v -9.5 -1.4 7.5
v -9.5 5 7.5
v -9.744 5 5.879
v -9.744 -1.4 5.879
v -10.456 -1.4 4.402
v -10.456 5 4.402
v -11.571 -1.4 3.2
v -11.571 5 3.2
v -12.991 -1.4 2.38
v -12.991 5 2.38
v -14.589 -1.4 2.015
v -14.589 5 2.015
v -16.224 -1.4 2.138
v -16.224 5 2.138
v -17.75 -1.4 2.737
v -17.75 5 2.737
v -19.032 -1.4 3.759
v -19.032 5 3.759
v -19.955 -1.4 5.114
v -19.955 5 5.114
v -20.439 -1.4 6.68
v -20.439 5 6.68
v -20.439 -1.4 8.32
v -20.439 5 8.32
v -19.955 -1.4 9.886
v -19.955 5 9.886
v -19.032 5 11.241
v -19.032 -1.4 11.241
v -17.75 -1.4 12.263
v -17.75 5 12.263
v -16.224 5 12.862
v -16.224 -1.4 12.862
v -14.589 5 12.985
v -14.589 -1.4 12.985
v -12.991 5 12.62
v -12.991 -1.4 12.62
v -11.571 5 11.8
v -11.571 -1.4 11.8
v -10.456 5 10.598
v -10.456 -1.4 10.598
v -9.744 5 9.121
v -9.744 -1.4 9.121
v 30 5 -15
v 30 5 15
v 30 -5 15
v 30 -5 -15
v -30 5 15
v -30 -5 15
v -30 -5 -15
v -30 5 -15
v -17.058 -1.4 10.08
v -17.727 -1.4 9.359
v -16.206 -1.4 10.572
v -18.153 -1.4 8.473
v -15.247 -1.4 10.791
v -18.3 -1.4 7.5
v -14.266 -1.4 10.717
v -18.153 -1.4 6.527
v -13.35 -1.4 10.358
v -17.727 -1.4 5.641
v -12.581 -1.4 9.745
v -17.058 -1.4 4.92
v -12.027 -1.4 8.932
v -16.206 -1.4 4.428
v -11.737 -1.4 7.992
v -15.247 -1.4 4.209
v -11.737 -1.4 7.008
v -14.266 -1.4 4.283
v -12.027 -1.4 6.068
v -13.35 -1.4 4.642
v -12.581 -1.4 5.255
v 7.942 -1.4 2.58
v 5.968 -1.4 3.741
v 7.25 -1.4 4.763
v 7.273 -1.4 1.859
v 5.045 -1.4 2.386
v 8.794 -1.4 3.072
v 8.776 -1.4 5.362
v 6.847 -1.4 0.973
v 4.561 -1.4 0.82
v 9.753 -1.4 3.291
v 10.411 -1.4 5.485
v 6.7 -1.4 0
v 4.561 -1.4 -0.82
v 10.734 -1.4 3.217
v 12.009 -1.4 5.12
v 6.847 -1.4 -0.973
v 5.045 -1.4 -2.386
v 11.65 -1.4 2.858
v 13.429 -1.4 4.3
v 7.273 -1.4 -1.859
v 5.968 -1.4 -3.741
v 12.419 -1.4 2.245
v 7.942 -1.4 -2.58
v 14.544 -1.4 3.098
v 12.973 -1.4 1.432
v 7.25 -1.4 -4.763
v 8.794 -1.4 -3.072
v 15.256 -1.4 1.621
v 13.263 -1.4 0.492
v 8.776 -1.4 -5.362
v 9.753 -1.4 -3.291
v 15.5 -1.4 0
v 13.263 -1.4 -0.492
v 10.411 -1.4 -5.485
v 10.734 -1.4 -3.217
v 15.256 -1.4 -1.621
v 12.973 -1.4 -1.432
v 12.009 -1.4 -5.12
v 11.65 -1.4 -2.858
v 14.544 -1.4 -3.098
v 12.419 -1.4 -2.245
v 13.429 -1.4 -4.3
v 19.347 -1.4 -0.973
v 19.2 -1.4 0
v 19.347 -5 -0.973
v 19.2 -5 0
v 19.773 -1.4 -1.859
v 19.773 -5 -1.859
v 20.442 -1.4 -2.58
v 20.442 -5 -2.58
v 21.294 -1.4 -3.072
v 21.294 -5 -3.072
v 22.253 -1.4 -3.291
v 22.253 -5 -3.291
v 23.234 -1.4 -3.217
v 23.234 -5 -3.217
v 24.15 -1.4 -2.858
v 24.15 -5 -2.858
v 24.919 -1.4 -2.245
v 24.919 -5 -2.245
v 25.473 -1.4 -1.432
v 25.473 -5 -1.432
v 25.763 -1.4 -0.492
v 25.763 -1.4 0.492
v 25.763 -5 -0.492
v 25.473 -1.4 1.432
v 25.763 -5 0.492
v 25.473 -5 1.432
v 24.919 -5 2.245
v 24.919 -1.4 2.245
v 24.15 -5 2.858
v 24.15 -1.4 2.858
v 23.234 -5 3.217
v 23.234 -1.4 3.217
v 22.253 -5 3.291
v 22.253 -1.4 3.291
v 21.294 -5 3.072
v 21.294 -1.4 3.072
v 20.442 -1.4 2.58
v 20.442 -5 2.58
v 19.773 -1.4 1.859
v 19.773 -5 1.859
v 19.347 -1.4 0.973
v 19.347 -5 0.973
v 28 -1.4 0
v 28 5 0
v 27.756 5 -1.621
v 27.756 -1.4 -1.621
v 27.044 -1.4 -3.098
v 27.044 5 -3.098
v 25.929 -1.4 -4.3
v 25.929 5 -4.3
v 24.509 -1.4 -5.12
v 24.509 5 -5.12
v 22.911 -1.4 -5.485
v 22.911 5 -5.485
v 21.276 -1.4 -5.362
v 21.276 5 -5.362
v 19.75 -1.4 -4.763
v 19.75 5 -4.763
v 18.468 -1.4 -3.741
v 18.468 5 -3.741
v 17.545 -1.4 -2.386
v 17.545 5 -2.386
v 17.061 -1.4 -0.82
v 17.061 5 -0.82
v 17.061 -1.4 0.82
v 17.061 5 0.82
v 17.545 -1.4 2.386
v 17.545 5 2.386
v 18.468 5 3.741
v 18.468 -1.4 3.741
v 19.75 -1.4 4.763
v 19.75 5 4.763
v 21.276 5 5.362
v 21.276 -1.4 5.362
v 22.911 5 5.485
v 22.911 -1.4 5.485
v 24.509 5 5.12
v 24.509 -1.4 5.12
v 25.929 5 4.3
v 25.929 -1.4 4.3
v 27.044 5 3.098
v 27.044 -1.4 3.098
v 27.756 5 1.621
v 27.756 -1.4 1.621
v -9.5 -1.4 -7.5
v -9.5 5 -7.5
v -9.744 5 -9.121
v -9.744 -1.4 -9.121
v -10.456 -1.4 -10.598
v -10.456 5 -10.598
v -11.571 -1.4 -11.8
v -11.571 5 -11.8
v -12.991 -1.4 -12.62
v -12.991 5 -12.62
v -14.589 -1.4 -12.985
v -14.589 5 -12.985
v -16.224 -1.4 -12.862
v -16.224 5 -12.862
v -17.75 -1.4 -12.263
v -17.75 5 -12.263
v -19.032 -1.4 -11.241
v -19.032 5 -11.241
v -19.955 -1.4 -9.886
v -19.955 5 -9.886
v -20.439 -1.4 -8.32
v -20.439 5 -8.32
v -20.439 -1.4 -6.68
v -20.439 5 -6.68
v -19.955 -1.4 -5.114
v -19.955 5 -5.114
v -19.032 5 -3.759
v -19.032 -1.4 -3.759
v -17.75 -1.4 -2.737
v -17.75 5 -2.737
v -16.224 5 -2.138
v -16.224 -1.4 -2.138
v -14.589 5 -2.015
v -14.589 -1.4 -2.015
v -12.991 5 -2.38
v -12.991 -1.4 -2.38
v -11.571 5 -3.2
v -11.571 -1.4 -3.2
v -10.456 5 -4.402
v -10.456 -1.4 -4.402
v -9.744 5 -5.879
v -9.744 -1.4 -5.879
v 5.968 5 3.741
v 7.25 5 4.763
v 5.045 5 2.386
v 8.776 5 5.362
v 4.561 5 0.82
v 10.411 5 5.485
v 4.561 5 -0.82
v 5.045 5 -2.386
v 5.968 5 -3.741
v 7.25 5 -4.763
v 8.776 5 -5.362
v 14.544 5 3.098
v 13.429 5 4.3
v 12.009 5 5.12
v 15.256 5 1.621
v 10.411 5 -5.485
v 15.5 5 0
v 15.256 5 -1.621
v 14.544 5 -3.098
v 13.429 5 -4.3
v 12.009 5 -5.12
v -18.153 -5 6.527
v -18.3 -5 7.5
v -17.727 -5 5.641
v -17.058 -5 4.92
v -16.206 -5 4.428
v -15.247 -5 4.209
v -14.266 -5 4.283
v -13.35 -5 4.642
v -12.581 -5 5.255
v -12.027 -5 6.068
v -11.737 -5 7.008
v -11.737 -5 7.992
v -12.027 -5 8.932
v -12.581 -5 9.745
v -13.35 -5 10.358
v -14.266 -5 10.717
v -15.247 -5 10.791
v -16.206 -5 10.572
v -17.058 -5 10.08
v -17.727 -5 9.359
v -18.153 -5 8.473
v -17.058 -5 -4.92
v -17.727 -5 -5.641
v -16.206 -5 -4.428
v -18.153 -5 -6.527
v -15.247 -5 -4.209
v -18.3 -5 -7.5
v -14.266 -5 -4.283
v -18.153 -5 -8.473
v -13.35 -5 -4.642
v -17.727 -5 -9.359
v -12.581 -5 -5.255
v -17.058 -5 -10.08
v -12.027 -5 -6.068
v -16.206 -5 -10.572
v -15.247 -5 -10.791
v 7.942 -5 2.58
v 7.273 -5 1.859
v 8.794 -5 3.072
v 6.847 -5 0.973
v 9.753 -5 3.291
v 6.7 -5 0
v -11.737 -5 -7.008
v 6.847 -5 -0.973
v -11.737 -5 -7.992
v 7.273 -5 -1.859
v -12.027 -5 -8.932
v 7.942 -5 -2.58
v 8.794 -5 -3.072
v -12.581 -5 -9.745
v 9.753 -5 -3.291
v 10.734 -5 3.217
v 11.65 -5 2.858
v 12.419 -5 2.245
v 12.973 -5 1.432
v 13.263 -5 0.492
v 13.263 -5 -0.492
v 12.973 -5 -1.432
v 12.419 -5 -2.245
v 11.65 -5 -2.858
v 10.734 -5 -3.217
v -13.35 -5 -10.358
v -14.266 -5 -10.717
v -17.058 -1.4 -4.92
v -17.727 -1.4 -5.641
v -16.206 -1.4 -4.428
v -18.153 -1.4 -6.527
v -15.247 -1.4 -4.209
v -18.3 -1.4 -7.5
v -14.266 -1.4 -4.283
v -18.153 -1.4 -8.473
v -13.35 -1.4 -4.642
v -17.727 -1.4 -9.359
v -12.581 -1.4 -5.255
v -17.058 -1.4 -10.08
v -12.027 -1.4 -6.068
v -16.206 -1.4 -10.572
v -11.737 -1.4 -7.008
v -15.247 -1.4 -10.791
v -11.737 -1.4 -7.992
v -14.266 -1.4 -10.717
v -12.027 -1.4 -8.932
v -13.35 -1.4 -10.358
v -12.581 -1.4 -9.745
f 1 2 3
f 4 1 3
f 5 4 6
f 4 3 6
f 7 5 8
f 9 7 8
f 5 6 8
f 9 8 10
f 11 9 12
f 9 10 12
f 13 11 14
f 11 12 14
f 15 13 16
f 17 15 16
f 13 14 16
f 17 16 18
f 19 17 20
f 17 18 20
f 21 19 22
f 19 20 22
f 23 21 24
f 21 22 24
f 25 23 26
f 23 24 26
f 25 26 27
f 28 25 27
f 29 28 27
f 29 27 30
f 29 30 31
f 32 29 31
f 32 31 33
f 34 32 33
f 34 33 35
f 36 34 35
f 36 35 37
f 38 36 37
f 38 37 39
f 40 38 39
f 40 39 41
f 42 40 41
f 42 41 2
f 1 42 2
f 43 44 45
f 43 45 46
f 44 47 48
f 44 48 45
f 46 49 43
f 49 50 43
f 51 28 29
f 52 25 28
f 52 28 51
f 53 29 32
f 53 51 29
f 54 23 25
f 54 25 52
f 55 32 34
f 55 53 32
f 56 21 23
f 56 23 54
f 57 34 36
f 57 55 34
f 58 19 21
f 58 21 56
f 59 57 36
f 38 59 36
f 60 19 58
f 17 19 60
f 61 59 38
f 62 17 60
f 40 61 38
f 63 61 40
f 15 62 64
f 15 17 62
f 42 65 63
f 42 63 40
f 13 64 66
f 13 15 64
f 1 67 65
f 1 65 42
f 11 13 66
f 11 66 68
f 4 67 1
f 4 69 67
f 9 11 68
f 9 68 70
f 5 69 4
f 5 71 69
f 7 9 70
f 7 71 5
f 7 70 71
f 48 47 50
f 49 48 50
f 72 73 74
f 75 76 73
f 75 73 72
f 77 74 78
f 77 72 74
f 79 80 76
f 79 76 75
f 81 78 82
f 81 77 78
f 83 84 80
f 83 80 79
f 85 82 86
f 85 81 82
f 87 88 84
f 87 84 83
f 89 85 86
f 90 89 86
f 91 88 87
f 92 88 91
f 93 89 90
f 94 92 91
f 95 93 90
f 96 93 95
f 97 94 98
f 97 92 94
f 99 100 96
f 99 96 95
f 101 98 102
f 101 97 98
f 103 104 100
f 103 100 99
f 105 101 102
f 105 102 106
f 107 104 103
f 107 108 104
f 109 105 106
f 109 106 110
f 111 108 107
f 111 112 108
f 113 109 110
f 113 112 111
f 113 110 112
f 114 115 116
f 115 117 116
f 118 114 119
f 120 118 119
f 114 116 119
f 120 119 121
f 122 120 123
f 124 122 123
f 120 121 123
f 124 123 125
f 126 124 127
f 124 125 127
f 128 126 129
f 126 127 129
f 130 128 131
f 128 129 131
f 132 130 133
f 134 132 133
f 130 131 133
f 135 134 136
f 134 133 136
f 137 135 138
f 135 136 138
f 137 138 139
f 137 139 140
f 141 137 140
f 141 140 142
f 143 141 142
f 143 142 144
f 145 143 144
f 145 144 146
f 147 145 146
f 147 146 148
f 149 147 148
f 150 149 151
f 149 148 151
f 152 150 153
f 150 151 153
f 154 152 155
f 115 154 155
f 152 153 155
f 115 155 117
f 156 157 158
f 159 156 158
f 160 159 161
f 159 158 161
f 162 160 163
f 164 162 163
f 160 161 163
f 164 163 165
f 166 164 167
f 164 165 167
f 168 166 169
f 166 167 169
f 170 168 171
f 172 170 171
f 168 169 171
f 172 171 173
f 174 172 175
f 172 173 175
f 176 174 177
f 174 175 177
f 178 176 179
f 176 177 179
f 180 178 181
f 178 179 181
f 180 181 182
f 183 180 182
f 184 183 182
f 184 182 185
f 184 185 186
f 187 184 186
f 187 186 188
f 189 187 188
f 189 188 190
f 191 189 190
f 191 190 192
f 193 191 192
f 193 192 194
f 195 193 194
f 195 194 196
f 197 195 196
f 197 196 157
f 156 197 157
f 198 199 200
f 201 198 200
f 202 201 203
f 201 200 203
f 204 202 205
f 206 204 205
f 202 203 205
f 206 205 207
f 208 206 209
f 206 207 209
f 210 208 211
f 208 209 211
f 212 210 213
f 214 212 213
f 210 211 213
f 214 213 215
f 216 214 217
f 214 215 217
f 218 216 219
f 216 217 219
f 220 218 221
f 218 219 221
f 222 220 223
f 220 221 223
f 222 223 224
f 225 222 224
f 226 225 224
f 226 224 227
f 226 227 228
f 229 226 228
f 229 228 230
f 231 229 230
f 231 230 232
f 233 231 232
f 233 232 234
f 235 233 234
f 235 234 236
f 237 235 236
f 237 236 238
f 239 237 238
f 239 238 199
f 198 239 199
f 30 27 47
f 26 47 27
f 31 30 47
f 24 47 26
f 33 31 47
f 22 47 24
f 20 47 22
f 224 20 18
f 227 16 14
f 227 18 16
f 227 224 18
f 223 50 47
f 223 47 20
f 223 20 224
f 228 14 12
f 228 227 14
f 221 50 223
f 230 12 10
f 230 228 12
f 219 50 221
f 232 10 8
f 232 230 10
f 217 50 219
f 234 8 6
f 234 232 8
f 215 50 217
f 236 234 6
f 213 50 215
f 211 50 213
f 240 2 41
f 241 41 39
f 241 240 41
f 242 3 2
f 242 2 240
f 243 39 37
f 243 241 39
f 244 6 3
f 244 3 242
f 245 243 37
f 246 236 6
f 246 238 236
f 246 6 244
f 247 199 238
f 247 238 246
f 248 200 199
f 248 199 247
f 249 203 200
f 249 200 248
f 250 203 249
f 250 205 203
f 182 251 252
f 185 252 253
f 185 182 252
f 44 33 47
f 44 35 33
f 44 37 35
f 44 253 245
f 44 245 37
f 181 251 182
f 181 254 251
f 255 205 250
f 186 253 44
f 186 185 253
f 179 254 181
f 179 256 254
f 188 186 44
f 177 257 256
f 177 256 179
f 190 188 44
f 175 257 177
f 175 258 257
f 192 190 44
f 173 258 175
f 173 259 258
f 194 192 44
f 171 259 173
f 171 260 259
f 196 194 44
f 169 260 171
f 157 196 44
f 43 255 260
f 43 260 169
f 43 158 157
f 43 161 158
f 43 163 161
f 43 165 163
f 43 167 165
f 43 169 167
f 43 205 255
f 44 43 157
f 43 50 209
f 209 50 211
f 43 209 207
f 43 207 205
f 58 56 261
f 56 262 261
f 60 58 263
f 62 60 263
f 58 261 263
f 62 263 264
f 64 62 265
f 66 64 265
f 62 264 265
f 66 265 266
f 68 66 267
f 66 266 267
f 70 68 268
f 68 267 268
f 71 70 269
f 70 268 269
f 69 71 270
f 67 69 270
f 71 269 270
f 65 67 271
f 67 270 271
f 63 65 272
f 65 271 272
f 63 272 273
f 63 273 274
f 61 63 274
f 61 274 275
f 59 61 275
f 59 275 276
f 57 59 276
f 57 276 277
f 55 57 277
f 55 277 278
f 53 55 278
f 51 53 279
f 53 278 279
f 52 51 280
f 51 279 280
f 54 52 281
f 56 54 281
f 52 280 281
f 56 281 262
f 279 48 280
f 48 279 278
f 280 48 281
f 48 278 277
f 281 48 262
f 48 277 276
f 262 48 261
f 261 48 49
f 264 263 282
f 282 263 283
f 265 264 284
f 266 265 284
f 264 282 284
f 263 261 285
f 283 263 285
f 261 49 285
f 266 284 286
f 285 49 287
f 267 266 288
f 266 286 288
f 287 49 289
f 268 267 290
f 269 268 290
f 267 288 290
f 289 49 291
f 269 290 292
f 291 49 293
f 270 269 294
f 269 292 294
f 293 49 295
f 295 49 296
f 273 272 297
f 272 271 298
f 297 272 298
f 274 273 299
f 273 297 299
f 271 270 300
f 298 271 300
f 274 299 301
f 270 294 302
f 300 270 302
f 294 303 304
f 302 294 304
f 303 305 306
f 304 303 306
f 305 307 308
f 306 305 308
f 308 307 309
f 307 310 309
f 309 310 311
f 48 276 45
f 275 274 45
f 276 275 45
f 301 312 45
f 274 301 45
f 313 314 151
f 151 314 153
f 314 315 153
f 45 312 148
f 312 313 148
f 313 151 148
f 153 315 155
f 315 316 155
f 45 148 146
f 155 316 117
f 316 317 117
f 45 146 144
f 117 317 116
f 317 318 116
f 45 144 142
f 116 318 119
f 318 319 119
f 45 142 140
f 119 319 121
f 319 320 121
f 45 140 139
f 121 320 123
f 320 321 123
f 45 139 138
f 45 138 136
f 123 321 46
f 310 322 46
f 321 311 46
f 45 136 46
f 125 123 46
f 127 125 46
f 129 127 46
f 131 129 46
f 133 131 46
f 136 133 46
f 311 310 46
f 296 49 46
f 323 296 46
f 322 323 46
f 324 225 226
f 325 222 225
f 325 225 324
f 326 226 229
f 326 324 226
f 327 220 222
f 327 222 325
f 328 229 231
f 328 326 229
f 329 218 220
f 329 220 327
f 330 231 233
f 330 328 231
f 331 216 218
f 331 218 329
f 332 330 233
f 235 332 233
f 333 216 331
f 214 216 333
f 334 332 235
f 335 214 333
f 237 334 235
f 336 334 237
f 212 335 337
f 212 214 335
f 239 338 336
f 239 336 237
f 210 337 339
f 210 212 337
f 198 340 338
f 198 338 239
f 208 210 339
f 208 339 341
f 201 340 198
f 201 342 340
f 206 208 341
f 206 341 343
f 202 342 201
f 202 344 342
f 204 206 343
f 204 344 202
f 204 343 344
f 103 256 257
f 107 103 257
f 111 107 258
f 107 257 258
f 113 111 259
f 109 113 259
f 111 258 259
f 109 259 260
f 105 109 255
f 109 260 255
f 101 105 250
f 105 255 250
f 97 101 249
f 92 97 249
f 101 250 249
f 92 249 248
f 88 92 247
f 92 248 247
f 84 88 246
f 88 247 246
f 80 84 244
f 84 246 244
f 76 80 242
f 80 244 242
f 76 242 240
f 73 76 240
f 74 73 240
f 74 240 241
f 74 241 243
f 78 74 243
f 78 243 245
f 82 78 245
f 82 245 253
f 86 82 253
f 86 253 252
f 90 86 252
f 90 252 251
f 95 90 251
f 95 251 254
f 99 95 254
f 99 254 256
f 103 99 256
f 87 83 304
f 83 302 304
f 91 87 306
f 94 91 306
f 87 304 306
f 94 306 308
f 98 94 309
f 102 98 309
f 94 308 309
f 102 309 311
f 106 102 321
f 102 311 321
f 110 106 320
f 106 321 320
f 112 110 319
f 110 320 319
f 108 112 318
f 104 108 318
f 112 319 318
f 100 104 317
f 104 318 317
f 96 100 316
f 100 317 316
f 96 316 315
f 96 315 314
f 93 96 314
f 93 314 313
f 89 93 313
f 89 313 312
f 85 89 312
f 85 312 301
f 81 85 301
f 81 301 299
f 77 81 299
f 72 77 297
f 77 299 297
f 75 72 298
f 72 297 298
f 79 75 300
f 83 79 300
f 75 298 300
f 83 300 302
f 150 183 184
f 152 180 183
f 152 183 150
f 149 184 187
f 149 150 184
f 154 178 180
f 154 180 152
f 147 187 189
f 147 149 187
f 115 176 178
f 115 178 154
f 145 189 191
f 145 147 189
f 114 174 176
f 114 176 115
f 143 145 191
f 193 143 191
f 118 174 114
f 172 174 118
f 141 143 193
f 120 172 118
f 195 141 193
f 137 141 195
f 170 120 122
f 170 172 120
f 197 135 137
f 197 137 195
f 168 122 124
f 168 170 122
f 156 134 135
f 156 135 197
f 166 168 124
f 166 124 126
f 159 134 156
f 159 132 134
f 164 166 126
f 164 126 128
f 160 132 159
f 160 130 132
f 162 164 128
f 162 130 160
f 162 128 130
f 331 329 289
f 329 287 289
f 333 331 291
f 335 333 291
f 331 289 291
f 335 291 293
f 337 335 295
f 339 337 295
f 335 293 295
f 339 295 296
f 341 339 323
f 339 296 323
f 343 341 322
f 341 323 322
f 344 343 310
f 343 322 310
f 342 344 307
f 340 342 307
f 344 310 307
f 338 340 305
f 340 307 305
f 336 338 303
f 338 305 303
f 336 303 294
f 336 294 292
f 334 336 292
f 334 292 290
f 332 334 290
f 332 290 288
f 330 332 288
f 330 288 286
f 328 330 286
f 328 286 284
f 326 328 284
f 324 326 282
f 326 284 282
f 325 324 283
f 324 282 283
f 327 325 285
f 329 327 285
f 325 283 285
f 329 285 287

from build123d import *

# Parameters (mm, degrees)
SKETCH1_W                                           = 60
SKETCH1_H                                           = 30
BOSS_EXTRUDE1_DEPTH                                 = 5
CBORE_FOR_M6_HEX_SOCKET_HEAD_CAP_SCREW1_D           = 6.6
CBORE_FOR_M6_HEX_SOCKET_HEAD_CAP_SCREW1_CBORE_D     = 11
CBORE_FOR_M6_HEX_SOCKET_HEAD_CAP_SCREW1_CBORE_DEPTH = 6.4
CBORE_FOR_M6_HEX_SOCKET_HEAD_CAP_SCREW2_D           = 6.6
CBORE_FOR_M6_HEX_SOCKET_HEAD_CAP_SCREW2_CBORE_D     = 11
CBORE_FOR_M6_HEX_SOCKET_HEAD_CAP_SCREW2_CBORE_DEPTH = 6.4


with BuildPart() as part:
    # Sketch1 → Boss-Extrude1 (new, symmetric)
    with BuildSketch(Plane(origin=(0, 0, 0), x_dir=(1, 0, 0), z_dir=(0, 1, 0))):
        Rectangle(SKETCH1_W, SKETCH1_H)
    extrude(amount=BOSS_EXTRUDE1_DEPTH, both=True)

    # CBORE for M6 Hex Socket Head Cap Screw1 (through all)
    with Locations(Plane(origin=(0, 5, 0), x_dir=(1, 0, 0), z_dir=(0, 1, 0))):
        with Locations((-15, 7.5), (-15, -7.5)):
            CounterBoreHole(CBORE_FOR_M6_HEX_SOCKET_HEAD_CAP_SCREW1_D / 2, CBORE_FOR_M6_HEX_SOCKET_HEAD_CAP_SCREW1_CBORE_D / 2, CBORE_FOR_M6_HEX_SOCKET_HEAD_CAP_SCREW1_CBORE_DEPTH)

    # CBORE for M6 Hex Socket Head Cap Screw2 (through all)
    with Locations(Plane(origin=(0, 5, 0), x_dir=(1, 0, 0), z_dir=(0, 1, 0))):
        with Locations((10, 0), (22.5, 0)):
            CounterBoreHole(CBORE_FOR_M6_HEX_SOCKET_HEAD_CAP_SCREW2_D / 2, CBORE_FOR_M6_HEX_SOCKET_HEAD_CAP_SCREW2_CBORE_D / 2, CBORE_FOR_M6_HEX_SOCKET_HEAD_CAP_SCREW2_CBORE_DEPTH)


solid = part.part
